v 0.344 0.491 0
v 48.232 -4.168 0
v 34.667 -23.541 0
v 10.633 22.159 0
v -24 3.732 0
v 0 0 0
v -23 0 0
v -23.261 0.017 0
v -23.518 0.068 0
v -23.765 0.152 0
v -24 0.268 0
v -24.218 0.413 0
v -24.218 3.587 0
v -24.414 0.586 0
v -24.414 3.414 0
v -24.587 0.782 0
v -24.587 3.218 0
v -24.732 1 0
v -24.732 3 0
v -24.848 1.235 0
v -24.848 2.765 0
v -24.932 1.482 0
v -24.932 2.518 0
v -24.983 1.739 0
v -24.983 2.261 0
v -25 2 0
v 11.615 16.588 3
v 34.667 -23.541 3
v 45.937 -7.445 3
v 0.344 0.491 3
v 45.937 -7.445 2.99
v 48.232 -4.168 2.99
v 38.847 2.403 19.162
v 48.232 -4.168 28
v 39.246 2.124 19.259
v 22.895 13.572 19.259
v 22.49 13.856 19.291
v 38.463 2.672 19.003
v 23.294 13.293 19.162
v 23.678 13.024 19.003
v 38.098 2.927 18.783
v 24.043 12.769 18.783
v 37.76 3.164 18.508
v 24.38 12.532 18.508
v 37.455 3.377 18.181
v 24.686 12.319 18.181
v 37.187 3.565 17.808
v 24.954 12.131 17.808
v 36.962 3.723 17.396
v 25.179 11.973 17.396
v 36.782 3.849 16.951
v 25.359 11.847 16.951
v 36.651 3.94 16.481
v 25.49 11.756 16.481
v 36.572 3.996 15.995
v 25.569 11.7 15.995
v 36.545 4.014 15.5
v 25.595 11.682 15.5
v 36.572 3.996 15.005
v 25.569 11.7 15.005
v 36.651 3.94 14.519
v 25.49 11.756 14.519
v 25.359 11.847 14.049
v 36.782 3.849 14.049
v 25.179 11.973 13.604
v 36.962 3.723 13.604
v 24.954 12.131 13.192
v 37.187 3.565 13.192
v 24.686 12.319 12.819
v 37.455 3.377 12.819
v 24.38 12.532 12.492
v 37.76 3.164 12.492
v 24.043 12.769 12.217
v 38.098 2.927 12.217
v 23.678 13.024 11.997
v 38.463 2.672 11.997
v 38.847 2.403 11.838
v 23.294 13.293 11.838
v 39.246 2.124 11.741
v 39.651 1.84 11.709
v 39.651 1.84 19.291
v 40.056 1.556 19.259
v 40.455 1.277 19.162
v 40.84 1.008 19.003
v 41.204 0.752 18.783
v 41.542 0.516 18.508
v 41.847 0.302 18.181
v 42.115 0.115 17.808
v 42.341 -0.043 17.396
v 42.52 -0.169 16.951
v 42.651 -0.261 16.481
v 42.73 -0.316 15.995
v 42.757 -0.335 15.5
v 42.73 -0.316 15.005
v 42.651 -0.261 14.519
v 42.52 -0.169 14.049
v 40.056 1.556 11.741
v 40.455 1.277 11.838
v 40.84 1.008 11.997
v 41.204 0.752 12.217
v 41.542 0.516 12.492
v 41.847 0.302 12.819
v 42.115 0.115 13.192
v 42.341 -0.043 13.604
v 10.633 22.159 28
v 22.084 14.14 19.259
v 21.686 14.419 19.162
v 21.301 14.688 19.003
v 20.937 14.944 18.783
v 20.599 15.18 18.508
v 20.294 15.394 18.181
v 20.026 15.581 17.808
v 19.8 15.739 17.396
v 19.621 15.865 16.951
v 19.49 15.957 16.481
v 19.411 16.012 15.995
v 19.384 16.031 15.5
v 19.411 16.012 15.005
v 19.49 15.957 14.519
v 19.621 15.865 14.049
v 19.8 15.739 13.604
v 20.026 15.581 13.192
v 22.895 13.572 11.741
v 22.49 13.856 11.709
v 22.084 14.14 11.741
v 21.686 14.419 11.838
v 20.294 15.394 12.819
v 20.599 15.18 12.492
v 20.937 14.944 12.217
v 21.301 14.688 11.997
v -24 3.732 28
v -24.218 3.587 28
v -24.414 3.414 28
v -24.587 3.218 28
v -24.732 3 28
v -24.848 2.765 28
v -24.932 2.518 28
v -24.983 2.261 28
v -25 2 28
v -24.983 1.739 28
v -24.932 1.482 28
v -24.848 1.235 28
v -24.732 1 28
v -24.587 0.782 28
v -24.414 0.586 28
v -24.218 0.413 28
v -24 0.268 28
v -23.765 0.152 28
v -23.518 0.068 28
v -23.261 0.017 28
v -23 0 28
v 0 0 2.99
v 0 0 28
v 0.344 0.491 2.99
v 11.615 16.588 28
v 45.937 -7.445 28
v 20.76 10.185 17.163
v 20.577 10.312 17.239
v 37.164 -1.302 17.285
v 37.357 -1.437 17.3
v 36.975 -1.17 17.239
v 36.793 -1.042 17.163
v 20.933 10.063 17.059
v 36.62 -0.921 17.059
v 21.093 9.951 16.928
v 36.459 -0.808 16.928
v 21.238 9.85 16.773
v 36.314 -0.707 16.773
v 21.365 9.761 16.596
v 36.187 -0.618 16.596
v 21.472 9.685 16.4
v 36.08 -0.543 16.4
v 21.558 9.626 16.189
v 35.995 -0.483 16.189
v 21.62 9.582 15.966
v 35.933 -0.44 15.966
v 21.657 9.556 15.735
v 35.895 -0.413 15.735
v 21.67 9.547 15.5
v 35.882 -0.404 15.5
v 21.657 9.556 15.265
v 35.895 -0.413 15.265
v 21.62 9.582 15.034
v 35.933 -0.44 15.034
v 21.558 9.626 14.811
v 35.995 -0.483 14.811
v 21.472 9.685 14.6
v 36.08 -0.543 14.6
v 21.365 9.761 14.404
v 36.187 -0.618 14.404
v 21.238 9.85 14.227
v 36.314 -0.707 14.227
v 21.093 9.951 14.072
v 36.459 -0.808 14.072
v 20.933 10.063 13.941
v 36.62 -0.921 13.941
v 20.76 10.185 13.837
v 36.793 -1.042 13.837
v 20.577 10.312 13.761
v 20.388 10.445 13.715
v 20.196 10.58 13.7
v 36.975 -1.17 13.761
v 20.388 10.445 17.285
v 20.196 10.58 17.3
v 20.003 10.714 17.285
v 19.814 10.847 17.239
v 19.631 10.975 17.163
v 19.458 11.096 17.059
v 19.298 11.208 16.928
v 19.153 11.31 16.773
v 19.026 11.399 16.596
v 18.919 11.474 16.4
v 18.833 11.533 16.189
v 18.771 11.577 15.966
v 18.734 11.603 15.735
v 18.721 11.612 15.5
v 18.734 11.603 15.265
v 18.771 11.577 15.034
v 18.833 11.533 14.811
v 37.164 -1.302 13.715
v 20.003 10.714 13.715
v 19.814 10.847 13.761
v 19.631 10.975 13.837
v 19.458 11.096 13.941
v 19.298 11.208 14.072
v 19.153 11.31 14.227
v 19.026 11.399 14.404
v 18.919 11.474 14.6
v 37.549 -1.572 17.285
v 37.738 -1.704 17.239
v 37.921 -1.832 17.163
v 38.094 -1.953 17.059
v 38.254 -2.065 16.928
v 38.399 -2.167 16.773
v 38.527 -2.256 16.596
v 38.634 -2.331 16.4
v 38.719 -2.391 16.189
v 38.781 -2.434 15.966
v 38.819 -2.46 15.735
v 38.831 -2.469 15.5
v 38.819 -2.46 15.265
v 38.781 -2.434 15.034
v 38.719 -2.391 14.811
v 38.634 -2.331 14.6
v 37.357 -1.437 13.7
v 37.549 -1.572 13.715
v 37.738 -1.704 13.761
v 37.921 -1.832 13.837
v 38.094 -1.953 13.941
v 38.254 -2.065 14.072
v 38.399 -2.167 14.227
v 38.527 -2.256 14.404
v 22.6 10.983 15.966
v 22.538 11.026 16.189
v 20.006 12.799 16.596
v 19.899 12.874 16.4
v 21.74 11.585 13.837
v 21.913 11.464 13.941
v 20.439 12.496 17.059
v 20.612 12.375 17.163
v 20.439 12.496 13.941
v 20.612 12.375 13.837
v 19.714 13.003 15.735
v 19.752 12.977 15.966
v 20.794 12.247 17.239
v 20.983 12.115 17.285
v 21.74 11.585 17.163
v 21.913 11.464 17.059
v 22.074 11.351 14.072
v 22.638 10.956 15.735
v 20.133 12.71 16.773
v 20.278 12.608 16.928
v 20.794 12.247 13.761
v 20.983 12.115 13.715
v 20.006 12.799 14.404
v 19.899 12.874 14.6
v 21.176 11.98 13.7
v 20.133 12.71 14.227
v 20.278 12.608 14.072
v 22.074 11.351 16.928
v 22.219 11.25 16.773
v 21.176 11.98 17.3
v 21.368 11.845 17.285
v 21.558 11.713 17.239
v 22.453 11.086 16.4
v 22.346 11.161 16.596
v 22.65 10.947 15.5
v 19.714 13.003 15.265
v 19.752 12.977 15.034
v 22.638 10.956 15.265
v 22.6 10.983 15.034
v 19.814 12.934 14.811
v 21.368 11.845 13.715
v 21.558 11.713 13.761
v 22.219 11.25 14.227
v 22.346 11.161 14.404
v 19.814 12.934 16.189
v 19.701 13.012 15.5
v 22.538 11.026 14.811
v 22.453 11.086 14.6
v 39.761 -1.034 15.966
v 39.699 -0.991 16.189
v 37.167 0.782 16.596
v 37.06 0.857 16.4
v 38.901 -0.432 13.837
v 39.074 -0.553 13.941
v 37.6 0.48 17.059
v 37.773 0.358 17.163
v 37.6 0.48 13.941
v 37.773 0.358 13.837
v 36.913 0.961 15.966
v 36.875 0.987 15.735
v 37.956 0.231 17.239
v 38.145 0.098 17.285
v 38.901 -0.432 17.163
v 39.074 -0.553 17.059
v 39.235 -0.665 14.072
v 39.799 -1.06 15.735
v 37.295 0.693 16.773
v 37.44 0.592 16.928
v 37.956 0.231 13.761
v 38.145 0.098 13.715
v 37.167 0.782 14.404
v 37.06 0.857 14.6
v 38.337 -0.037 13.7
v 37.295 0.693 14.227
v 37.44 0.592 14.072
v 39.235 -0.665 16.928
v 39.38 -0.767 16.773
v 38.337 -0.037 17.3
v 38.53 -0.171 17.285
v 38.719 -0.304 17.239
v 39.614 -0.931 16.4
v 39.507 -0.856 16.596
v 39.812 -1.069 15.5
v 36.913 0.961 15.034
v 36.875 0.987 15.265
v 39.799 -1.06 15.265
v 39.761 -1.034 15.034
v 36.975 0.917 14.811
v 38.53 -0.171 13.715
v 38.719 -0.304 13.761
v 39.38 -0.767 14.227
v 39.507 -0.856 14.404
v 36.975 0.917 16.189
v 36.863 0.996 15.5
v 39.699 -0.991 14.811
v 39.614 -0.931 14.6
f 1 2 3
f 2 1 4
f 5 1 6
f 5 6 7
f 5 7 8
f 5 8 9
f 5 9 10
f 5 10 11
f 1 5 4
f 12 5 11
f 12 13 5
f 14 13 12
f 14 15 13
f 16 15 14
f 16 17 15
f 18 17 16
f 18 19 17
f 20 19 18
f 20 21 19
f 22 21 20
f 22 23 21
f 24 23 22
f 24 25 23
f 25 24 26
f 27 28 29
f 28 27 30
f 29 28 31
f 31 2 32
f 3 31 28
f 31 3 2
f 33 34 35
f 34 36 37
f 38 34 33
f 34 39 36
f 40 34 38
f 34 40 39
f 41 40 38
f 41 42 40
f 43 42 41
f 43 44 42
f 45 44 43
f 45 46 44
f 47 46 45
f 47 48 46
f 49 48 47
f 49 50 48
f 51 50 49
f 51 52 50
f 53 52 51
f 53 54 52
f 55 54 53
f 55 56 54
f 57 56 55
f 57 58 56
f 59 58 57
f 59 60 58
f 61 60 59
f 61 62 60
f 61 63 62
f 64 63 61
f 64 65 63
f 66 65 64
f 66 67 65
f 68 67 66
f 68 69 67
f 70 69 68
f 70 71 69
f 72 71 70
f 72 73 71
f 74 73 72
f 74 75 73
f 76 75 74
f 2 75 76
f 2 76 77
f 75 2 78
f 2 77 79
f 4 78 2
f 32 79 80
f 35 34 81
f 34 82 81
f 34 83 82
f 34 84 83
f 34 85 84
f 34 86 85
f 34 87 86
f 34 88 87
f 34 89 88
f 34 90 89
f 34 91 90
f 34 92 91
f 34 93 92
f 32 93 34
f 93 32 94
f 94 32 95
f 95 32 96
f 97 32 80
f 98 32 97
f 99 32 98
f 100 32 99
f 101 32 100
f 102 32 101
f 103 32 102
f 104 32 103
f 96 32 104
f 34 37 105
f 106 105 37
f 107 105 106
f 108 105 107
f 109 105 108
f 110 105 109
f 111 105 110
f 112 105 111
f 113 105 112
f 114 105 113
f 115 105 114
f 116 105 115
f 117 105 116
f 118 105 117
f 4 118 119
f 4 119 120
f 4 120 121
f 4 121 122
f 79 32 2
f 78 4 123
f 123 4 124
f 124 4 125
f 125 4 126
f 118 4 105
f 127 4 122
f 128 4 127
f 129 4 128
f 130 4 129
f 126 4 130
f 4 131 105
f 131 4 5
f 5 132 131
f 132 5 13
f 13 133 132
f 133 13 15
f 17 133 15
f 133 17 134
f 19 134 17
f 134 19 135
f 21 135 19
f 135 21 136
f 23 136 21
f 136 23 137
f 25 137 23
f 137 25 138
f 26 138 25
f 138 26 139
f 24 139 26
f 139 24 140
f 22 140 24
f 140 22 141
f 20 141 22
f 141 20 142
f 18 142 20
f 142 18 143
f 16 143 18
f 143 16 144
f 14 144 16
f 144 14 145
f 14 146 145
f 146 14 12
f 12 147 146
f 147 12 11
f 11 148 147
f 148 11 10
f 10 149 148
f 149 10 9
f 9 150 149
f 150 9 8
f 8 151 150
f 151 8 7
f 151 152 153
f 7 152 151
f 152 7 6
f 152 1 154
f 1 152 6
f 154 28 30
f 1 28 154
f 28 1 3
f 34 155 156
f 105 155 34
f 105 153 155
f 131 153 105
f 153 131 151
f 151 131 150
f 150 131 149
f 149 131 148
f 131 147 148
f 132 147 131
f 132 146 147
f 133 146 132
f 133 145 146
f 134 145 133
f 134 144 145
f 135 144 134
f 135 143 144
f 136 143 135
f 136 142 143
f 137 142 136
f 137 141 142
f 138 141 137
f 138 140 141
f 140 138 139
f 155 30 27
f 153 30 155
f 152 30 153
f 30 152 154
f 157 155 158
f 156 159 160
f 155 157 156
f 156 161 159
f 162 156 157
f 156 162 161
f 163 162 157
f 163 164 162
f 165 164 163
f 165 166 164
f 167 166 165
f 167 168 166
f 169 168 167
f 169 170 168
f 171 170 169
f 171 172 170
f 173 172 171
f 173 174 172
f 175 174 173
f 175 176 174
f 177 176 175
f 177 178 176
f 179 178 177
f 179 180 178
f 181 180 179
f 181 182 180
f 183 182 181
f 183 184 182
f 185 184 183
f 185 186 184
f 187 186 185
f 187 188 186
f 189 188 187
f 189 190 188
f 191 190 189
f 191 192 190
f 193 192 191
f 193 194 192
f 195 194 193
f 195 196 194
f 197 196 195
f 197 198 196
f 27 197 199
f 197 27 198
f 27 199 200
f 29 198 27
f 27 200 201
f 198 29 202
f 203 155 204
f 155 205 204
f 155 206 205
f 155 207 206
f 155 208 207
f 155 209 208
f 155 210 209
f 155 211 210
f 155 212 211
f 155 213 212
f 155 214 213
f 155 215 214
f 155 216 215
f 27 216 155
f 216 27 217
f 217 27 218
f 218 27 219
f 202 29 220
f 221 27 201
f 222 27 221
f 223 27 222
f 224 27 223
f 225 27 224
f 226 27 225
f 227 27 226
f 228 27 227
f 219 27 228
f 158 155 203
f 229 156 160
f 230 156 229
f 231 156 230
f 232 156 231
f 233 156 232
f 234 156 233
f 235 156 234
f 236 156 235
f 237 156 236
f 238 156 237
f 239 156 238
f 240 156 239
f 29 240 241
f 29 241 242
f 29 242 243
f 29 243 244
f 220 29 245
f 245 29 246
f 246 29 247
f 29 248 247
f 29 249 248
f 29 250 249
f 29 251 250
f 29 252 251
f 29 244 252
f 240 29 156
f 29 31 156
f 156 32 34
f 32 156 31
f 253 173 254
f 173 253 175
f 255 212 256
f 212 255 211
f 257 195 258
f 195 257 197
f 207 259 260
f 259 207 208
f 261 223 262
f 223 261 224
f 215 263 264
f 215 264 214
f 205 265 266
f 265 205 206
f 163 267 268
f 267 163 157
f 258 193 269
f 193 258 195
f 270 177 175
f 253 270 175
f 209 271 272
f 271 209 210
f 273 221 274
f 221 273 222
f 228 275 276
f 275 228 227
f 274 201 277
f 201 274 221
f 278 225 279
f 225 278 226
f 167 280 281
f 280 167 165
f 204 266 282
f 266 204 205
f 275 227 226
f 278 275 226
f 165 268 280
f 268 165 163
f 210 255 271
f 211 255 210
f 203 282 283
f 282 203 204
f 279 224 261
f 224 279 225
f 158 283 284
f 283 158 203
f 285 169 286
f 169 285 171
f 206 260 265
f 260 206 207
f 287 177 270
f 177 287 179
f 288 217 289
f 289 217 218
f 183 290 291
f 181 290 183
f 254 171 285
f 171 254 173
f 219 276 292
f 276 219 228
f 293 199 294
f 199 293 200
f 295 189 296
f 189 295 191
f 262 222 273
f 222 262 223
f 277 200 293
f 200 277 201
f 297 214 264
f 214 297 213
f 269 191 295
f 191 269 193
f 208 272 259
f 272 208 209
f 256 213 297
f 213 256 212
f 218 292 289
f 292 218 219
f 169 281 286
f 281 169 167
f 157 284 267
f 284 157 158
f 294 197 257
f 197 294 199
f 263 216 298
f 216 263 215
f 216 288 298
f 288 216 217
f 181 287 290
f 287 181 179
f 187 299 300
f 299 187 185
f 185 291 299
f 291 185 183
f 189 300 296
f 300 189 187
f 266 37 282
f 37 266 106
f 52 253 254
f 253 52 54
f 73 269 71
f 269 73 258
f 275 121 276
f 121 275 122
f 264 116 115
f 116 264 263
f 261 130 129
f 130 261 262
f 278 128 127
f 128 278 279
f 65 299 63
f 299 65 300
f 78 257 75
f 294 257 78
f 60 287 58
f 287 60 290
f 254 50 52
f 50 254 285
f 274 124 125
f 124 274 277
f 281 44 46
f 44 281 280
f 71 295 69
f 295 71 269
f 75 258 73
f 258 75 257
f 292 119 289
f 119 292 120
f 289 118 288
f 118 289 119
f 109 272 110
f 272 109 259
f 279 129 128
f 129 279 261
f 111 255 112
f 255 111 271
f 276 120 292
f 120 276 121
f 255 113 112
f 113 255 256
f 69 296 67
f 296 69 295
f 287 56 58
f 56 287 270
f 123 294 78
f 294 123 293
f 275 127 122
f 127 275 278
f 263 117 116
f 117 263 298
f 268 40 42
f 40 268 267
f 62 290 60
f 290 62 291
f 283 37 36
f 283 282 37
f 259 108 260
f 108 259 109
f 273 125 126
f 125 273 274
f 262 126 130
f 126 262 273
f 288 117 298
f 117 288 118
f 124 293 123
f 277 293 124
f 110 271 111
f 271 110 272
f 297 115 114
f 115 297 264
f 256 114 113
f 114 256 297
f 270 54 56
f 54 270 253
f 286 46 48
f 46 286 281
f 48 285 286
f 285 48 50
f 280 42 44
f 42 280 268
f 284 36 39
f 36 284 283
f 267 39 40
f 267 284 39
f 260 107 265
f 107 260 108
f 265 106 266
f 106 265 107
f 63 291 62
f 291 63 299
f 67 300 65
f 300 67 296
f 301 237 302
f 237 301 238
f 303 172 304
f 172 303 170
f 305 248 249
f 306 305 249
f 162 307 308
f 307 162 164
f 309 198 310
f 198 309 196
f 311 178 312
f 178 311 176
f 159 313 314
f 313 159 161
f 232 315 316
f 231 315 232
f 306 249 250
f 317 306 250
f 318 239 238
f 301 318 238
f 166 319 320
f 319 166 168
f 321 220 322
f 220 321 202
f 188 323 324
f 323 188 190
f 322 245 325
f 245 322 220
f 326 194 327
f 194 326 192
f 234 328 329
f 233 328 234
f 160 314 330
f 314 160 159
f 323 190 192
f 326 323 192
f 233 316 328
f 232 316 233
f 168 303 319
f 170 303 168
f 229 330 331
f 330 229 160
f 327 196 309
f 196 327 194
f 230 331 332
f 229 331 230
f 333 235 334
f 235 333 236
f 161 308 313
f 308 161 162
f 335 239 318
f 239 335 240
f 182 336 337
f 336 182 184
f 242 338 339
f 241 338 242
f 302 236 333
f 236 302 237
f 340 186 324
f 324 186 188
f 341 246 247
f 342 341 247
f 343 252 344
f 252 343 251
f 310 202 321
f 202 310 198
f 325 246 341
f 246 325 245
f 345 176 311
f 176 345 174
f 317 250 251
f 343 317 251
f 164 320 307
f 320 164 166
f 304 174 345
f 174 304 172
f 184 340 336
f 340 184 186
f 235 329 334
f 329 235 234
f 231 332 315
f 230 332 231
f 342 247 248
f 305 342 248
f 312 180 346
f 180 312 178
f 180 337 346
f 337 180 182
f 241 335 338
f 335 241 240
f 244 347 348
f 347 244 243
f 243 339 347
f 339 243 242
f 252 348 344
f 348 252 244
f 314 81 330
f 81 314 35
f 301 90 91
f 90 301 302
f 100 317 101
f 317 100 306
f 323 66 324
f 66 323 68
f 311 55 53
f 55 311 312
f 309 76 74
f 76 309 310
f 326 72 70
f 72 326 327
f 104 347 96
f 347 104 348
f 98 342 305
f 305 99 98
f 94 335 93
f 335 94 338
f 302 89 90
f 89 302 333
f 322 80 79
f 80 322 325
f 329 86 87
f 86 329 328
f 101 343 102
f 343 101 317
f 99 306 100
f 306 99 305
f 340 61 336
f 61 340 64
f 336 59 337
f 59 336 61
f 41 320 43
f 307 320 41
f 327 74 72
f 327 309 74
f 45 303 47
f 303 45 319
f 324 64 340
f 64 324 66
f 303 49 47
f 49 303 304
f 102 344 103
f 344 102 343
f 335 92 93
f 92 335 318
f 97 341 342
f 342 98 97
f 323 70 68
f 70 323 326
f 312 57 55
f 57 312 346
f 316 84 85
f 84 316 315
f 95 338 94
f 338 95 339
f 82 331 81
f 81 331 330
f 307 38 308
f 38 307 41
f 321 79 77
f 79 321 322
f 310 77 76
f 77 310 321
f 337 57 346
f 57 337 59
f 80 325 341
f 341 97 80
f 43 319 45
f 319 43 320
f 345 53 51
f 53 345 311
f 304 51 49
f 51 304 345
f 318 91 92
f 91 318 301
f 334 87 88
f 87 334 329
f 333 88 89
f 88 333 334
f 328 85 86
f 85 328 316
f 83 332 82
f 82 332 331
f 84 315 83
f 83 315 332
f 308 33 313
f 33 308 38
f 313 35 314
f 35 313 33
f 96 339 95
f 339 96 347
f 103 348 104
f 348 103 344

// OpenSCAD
// End brackets that turn a furring strip into a 35-degree bevel sanding block.
//
// End view (looking along the strip):
//
//            ______
//           /     /|   <- back flange, screwed to the back of the strip
//          / wood/ |
//    _____/_____/  |   <- the strip; sandpaper glued on its front face
//   |  foot   V \
//   ‾‾‾‾‾‾‾‾‾‾‾‾‾‾\    <- sanding face, 35 deg below the foot plane
//
// The foot rides flat on the foam's face; the sandpaper meets it at V with a
// 145-degree open angle, so the sanded surface ends up 35 degrees off the face.
// Units: mm. Print one "left" and one "right" (mirror images), end cap down.

/* [Wood strip] */
wood_width = 41.3;      // the face that carries sandpaper (1 5/8 in)
wood_thickness = 19.05; // (0.75 in)
wood_clearance = 0.6;   // total, added to both pocket dimensions
paper_thickness = 0.6;  // sandpaper (plus glue) on the front face

/* [Geometry] */
bevel_angle = 35;       // between the foam face and the sanded bevel
foot_length = 25;       // contact on the foam face, measured from V
foot_thickness = 4;
wall = 4;               // inner-edge wall and back flange
bracket_length = 25;    // along the strip, from the wood's end
end_cap = 3;            // plate over the wood's end grain; 0 for none
nose_radius = 2;        // round on the foot's trailing edge

/* [Screws] */
screw_d = 3.6;          // clearance for #6 wood screws
head_d = 7.6;           // 82-degree countersink diameter at the surface

side = "left";          // [left, right]
build = true;           // preview.scad turns this off to place its own copies

$fn = 48;

d = [cos(bevel_angle), -sin(bevel_angle)];  // down the sanding face, away from the foot
n = [sin(bevel_angle), cos(bevel_angle)];   // out of the sanding face, into the block
ww = wood_width + wood_clearance;
wt = wood_thickness + wood_clearance;
o = paper_thickness * n;                    // front-inner corner of the wood pocket

function at(u, v) = o + u * d + v * n;      // strip-local coordinates -> profile

// Wood pocket; front face (v < 0) left open past the sanding plane.
module pocket() polygon([at(0, -5), at(ww + 5, -5), at(ww + 5, wt), at(0, wt)]);

module profile() {
    difference() {
        union() {
            // Foot plus the gusset up to the top of the inner-edge wall.
            hull() {
                translate([-foot_length + nose_radius, nose_radius]) circle(nose_radius);
                translate([-foot_length + nose_radius, 0]) square([foot_length - nose_radius, foot_thickness]);
                polygon([[0, 0], at(0, 0), at(0, wt + wall), at(-wall, wt + wall), at(-wall, 0)]);
            }
            // Back flange across the full width of the strip.
            polygon([at(-wall, wt), at(ww, wt), at(ww, wt + wall), at(-wall, wt + wall)]);
        }
        pocket();
    }
}

// Same outline, closed over the pocket: the end cap.
module cap_profile() {
    union() {
        profile();
        polygon([at(0, 0), at(ww, 0), at(ww, wt), at(0, wt)]);
    }
}

module screw_hole(u) {
    // Placed on the flange's outer face, drilled along -n into the wood.
    p = at(u, wt + wall);
    a = atan2(n[1], n[0]);
    translate([p[0], p[1], end_cap + bracket_length / 2])
        rotate([0, 0, a]) rotate([0, -90, 0]) {
            translate([0, 0, -1]) cylinder(d = screw_d, h = wall + 2);
            translate([0, 0, -0.01]) cylinder(d1 = head_d, d2 = 0, h = head_d / 2 / tan(41));
            translate([0, 0, -5]) cylinder(d = head_d, h = 5);
        }
}

module bracket() {
    difference() {
        union() {
            if (end_cap > 0) linear_extrude(end_cap) cap_profile();
            translate([0, 0, end_cap - 0.01]) linear_extrude(bracket_length + 0.01) profile();
        }
        for (u = [ww / 4, 3 * ww / 4]) screw_hole(u);
    }
}

// Printed with the end cap on the bed (Z = 0); Z runs along the strip.
if (build) {
    if (side == "right") mirror([1, 0, 0]) bracket();
    else bracket();
}
